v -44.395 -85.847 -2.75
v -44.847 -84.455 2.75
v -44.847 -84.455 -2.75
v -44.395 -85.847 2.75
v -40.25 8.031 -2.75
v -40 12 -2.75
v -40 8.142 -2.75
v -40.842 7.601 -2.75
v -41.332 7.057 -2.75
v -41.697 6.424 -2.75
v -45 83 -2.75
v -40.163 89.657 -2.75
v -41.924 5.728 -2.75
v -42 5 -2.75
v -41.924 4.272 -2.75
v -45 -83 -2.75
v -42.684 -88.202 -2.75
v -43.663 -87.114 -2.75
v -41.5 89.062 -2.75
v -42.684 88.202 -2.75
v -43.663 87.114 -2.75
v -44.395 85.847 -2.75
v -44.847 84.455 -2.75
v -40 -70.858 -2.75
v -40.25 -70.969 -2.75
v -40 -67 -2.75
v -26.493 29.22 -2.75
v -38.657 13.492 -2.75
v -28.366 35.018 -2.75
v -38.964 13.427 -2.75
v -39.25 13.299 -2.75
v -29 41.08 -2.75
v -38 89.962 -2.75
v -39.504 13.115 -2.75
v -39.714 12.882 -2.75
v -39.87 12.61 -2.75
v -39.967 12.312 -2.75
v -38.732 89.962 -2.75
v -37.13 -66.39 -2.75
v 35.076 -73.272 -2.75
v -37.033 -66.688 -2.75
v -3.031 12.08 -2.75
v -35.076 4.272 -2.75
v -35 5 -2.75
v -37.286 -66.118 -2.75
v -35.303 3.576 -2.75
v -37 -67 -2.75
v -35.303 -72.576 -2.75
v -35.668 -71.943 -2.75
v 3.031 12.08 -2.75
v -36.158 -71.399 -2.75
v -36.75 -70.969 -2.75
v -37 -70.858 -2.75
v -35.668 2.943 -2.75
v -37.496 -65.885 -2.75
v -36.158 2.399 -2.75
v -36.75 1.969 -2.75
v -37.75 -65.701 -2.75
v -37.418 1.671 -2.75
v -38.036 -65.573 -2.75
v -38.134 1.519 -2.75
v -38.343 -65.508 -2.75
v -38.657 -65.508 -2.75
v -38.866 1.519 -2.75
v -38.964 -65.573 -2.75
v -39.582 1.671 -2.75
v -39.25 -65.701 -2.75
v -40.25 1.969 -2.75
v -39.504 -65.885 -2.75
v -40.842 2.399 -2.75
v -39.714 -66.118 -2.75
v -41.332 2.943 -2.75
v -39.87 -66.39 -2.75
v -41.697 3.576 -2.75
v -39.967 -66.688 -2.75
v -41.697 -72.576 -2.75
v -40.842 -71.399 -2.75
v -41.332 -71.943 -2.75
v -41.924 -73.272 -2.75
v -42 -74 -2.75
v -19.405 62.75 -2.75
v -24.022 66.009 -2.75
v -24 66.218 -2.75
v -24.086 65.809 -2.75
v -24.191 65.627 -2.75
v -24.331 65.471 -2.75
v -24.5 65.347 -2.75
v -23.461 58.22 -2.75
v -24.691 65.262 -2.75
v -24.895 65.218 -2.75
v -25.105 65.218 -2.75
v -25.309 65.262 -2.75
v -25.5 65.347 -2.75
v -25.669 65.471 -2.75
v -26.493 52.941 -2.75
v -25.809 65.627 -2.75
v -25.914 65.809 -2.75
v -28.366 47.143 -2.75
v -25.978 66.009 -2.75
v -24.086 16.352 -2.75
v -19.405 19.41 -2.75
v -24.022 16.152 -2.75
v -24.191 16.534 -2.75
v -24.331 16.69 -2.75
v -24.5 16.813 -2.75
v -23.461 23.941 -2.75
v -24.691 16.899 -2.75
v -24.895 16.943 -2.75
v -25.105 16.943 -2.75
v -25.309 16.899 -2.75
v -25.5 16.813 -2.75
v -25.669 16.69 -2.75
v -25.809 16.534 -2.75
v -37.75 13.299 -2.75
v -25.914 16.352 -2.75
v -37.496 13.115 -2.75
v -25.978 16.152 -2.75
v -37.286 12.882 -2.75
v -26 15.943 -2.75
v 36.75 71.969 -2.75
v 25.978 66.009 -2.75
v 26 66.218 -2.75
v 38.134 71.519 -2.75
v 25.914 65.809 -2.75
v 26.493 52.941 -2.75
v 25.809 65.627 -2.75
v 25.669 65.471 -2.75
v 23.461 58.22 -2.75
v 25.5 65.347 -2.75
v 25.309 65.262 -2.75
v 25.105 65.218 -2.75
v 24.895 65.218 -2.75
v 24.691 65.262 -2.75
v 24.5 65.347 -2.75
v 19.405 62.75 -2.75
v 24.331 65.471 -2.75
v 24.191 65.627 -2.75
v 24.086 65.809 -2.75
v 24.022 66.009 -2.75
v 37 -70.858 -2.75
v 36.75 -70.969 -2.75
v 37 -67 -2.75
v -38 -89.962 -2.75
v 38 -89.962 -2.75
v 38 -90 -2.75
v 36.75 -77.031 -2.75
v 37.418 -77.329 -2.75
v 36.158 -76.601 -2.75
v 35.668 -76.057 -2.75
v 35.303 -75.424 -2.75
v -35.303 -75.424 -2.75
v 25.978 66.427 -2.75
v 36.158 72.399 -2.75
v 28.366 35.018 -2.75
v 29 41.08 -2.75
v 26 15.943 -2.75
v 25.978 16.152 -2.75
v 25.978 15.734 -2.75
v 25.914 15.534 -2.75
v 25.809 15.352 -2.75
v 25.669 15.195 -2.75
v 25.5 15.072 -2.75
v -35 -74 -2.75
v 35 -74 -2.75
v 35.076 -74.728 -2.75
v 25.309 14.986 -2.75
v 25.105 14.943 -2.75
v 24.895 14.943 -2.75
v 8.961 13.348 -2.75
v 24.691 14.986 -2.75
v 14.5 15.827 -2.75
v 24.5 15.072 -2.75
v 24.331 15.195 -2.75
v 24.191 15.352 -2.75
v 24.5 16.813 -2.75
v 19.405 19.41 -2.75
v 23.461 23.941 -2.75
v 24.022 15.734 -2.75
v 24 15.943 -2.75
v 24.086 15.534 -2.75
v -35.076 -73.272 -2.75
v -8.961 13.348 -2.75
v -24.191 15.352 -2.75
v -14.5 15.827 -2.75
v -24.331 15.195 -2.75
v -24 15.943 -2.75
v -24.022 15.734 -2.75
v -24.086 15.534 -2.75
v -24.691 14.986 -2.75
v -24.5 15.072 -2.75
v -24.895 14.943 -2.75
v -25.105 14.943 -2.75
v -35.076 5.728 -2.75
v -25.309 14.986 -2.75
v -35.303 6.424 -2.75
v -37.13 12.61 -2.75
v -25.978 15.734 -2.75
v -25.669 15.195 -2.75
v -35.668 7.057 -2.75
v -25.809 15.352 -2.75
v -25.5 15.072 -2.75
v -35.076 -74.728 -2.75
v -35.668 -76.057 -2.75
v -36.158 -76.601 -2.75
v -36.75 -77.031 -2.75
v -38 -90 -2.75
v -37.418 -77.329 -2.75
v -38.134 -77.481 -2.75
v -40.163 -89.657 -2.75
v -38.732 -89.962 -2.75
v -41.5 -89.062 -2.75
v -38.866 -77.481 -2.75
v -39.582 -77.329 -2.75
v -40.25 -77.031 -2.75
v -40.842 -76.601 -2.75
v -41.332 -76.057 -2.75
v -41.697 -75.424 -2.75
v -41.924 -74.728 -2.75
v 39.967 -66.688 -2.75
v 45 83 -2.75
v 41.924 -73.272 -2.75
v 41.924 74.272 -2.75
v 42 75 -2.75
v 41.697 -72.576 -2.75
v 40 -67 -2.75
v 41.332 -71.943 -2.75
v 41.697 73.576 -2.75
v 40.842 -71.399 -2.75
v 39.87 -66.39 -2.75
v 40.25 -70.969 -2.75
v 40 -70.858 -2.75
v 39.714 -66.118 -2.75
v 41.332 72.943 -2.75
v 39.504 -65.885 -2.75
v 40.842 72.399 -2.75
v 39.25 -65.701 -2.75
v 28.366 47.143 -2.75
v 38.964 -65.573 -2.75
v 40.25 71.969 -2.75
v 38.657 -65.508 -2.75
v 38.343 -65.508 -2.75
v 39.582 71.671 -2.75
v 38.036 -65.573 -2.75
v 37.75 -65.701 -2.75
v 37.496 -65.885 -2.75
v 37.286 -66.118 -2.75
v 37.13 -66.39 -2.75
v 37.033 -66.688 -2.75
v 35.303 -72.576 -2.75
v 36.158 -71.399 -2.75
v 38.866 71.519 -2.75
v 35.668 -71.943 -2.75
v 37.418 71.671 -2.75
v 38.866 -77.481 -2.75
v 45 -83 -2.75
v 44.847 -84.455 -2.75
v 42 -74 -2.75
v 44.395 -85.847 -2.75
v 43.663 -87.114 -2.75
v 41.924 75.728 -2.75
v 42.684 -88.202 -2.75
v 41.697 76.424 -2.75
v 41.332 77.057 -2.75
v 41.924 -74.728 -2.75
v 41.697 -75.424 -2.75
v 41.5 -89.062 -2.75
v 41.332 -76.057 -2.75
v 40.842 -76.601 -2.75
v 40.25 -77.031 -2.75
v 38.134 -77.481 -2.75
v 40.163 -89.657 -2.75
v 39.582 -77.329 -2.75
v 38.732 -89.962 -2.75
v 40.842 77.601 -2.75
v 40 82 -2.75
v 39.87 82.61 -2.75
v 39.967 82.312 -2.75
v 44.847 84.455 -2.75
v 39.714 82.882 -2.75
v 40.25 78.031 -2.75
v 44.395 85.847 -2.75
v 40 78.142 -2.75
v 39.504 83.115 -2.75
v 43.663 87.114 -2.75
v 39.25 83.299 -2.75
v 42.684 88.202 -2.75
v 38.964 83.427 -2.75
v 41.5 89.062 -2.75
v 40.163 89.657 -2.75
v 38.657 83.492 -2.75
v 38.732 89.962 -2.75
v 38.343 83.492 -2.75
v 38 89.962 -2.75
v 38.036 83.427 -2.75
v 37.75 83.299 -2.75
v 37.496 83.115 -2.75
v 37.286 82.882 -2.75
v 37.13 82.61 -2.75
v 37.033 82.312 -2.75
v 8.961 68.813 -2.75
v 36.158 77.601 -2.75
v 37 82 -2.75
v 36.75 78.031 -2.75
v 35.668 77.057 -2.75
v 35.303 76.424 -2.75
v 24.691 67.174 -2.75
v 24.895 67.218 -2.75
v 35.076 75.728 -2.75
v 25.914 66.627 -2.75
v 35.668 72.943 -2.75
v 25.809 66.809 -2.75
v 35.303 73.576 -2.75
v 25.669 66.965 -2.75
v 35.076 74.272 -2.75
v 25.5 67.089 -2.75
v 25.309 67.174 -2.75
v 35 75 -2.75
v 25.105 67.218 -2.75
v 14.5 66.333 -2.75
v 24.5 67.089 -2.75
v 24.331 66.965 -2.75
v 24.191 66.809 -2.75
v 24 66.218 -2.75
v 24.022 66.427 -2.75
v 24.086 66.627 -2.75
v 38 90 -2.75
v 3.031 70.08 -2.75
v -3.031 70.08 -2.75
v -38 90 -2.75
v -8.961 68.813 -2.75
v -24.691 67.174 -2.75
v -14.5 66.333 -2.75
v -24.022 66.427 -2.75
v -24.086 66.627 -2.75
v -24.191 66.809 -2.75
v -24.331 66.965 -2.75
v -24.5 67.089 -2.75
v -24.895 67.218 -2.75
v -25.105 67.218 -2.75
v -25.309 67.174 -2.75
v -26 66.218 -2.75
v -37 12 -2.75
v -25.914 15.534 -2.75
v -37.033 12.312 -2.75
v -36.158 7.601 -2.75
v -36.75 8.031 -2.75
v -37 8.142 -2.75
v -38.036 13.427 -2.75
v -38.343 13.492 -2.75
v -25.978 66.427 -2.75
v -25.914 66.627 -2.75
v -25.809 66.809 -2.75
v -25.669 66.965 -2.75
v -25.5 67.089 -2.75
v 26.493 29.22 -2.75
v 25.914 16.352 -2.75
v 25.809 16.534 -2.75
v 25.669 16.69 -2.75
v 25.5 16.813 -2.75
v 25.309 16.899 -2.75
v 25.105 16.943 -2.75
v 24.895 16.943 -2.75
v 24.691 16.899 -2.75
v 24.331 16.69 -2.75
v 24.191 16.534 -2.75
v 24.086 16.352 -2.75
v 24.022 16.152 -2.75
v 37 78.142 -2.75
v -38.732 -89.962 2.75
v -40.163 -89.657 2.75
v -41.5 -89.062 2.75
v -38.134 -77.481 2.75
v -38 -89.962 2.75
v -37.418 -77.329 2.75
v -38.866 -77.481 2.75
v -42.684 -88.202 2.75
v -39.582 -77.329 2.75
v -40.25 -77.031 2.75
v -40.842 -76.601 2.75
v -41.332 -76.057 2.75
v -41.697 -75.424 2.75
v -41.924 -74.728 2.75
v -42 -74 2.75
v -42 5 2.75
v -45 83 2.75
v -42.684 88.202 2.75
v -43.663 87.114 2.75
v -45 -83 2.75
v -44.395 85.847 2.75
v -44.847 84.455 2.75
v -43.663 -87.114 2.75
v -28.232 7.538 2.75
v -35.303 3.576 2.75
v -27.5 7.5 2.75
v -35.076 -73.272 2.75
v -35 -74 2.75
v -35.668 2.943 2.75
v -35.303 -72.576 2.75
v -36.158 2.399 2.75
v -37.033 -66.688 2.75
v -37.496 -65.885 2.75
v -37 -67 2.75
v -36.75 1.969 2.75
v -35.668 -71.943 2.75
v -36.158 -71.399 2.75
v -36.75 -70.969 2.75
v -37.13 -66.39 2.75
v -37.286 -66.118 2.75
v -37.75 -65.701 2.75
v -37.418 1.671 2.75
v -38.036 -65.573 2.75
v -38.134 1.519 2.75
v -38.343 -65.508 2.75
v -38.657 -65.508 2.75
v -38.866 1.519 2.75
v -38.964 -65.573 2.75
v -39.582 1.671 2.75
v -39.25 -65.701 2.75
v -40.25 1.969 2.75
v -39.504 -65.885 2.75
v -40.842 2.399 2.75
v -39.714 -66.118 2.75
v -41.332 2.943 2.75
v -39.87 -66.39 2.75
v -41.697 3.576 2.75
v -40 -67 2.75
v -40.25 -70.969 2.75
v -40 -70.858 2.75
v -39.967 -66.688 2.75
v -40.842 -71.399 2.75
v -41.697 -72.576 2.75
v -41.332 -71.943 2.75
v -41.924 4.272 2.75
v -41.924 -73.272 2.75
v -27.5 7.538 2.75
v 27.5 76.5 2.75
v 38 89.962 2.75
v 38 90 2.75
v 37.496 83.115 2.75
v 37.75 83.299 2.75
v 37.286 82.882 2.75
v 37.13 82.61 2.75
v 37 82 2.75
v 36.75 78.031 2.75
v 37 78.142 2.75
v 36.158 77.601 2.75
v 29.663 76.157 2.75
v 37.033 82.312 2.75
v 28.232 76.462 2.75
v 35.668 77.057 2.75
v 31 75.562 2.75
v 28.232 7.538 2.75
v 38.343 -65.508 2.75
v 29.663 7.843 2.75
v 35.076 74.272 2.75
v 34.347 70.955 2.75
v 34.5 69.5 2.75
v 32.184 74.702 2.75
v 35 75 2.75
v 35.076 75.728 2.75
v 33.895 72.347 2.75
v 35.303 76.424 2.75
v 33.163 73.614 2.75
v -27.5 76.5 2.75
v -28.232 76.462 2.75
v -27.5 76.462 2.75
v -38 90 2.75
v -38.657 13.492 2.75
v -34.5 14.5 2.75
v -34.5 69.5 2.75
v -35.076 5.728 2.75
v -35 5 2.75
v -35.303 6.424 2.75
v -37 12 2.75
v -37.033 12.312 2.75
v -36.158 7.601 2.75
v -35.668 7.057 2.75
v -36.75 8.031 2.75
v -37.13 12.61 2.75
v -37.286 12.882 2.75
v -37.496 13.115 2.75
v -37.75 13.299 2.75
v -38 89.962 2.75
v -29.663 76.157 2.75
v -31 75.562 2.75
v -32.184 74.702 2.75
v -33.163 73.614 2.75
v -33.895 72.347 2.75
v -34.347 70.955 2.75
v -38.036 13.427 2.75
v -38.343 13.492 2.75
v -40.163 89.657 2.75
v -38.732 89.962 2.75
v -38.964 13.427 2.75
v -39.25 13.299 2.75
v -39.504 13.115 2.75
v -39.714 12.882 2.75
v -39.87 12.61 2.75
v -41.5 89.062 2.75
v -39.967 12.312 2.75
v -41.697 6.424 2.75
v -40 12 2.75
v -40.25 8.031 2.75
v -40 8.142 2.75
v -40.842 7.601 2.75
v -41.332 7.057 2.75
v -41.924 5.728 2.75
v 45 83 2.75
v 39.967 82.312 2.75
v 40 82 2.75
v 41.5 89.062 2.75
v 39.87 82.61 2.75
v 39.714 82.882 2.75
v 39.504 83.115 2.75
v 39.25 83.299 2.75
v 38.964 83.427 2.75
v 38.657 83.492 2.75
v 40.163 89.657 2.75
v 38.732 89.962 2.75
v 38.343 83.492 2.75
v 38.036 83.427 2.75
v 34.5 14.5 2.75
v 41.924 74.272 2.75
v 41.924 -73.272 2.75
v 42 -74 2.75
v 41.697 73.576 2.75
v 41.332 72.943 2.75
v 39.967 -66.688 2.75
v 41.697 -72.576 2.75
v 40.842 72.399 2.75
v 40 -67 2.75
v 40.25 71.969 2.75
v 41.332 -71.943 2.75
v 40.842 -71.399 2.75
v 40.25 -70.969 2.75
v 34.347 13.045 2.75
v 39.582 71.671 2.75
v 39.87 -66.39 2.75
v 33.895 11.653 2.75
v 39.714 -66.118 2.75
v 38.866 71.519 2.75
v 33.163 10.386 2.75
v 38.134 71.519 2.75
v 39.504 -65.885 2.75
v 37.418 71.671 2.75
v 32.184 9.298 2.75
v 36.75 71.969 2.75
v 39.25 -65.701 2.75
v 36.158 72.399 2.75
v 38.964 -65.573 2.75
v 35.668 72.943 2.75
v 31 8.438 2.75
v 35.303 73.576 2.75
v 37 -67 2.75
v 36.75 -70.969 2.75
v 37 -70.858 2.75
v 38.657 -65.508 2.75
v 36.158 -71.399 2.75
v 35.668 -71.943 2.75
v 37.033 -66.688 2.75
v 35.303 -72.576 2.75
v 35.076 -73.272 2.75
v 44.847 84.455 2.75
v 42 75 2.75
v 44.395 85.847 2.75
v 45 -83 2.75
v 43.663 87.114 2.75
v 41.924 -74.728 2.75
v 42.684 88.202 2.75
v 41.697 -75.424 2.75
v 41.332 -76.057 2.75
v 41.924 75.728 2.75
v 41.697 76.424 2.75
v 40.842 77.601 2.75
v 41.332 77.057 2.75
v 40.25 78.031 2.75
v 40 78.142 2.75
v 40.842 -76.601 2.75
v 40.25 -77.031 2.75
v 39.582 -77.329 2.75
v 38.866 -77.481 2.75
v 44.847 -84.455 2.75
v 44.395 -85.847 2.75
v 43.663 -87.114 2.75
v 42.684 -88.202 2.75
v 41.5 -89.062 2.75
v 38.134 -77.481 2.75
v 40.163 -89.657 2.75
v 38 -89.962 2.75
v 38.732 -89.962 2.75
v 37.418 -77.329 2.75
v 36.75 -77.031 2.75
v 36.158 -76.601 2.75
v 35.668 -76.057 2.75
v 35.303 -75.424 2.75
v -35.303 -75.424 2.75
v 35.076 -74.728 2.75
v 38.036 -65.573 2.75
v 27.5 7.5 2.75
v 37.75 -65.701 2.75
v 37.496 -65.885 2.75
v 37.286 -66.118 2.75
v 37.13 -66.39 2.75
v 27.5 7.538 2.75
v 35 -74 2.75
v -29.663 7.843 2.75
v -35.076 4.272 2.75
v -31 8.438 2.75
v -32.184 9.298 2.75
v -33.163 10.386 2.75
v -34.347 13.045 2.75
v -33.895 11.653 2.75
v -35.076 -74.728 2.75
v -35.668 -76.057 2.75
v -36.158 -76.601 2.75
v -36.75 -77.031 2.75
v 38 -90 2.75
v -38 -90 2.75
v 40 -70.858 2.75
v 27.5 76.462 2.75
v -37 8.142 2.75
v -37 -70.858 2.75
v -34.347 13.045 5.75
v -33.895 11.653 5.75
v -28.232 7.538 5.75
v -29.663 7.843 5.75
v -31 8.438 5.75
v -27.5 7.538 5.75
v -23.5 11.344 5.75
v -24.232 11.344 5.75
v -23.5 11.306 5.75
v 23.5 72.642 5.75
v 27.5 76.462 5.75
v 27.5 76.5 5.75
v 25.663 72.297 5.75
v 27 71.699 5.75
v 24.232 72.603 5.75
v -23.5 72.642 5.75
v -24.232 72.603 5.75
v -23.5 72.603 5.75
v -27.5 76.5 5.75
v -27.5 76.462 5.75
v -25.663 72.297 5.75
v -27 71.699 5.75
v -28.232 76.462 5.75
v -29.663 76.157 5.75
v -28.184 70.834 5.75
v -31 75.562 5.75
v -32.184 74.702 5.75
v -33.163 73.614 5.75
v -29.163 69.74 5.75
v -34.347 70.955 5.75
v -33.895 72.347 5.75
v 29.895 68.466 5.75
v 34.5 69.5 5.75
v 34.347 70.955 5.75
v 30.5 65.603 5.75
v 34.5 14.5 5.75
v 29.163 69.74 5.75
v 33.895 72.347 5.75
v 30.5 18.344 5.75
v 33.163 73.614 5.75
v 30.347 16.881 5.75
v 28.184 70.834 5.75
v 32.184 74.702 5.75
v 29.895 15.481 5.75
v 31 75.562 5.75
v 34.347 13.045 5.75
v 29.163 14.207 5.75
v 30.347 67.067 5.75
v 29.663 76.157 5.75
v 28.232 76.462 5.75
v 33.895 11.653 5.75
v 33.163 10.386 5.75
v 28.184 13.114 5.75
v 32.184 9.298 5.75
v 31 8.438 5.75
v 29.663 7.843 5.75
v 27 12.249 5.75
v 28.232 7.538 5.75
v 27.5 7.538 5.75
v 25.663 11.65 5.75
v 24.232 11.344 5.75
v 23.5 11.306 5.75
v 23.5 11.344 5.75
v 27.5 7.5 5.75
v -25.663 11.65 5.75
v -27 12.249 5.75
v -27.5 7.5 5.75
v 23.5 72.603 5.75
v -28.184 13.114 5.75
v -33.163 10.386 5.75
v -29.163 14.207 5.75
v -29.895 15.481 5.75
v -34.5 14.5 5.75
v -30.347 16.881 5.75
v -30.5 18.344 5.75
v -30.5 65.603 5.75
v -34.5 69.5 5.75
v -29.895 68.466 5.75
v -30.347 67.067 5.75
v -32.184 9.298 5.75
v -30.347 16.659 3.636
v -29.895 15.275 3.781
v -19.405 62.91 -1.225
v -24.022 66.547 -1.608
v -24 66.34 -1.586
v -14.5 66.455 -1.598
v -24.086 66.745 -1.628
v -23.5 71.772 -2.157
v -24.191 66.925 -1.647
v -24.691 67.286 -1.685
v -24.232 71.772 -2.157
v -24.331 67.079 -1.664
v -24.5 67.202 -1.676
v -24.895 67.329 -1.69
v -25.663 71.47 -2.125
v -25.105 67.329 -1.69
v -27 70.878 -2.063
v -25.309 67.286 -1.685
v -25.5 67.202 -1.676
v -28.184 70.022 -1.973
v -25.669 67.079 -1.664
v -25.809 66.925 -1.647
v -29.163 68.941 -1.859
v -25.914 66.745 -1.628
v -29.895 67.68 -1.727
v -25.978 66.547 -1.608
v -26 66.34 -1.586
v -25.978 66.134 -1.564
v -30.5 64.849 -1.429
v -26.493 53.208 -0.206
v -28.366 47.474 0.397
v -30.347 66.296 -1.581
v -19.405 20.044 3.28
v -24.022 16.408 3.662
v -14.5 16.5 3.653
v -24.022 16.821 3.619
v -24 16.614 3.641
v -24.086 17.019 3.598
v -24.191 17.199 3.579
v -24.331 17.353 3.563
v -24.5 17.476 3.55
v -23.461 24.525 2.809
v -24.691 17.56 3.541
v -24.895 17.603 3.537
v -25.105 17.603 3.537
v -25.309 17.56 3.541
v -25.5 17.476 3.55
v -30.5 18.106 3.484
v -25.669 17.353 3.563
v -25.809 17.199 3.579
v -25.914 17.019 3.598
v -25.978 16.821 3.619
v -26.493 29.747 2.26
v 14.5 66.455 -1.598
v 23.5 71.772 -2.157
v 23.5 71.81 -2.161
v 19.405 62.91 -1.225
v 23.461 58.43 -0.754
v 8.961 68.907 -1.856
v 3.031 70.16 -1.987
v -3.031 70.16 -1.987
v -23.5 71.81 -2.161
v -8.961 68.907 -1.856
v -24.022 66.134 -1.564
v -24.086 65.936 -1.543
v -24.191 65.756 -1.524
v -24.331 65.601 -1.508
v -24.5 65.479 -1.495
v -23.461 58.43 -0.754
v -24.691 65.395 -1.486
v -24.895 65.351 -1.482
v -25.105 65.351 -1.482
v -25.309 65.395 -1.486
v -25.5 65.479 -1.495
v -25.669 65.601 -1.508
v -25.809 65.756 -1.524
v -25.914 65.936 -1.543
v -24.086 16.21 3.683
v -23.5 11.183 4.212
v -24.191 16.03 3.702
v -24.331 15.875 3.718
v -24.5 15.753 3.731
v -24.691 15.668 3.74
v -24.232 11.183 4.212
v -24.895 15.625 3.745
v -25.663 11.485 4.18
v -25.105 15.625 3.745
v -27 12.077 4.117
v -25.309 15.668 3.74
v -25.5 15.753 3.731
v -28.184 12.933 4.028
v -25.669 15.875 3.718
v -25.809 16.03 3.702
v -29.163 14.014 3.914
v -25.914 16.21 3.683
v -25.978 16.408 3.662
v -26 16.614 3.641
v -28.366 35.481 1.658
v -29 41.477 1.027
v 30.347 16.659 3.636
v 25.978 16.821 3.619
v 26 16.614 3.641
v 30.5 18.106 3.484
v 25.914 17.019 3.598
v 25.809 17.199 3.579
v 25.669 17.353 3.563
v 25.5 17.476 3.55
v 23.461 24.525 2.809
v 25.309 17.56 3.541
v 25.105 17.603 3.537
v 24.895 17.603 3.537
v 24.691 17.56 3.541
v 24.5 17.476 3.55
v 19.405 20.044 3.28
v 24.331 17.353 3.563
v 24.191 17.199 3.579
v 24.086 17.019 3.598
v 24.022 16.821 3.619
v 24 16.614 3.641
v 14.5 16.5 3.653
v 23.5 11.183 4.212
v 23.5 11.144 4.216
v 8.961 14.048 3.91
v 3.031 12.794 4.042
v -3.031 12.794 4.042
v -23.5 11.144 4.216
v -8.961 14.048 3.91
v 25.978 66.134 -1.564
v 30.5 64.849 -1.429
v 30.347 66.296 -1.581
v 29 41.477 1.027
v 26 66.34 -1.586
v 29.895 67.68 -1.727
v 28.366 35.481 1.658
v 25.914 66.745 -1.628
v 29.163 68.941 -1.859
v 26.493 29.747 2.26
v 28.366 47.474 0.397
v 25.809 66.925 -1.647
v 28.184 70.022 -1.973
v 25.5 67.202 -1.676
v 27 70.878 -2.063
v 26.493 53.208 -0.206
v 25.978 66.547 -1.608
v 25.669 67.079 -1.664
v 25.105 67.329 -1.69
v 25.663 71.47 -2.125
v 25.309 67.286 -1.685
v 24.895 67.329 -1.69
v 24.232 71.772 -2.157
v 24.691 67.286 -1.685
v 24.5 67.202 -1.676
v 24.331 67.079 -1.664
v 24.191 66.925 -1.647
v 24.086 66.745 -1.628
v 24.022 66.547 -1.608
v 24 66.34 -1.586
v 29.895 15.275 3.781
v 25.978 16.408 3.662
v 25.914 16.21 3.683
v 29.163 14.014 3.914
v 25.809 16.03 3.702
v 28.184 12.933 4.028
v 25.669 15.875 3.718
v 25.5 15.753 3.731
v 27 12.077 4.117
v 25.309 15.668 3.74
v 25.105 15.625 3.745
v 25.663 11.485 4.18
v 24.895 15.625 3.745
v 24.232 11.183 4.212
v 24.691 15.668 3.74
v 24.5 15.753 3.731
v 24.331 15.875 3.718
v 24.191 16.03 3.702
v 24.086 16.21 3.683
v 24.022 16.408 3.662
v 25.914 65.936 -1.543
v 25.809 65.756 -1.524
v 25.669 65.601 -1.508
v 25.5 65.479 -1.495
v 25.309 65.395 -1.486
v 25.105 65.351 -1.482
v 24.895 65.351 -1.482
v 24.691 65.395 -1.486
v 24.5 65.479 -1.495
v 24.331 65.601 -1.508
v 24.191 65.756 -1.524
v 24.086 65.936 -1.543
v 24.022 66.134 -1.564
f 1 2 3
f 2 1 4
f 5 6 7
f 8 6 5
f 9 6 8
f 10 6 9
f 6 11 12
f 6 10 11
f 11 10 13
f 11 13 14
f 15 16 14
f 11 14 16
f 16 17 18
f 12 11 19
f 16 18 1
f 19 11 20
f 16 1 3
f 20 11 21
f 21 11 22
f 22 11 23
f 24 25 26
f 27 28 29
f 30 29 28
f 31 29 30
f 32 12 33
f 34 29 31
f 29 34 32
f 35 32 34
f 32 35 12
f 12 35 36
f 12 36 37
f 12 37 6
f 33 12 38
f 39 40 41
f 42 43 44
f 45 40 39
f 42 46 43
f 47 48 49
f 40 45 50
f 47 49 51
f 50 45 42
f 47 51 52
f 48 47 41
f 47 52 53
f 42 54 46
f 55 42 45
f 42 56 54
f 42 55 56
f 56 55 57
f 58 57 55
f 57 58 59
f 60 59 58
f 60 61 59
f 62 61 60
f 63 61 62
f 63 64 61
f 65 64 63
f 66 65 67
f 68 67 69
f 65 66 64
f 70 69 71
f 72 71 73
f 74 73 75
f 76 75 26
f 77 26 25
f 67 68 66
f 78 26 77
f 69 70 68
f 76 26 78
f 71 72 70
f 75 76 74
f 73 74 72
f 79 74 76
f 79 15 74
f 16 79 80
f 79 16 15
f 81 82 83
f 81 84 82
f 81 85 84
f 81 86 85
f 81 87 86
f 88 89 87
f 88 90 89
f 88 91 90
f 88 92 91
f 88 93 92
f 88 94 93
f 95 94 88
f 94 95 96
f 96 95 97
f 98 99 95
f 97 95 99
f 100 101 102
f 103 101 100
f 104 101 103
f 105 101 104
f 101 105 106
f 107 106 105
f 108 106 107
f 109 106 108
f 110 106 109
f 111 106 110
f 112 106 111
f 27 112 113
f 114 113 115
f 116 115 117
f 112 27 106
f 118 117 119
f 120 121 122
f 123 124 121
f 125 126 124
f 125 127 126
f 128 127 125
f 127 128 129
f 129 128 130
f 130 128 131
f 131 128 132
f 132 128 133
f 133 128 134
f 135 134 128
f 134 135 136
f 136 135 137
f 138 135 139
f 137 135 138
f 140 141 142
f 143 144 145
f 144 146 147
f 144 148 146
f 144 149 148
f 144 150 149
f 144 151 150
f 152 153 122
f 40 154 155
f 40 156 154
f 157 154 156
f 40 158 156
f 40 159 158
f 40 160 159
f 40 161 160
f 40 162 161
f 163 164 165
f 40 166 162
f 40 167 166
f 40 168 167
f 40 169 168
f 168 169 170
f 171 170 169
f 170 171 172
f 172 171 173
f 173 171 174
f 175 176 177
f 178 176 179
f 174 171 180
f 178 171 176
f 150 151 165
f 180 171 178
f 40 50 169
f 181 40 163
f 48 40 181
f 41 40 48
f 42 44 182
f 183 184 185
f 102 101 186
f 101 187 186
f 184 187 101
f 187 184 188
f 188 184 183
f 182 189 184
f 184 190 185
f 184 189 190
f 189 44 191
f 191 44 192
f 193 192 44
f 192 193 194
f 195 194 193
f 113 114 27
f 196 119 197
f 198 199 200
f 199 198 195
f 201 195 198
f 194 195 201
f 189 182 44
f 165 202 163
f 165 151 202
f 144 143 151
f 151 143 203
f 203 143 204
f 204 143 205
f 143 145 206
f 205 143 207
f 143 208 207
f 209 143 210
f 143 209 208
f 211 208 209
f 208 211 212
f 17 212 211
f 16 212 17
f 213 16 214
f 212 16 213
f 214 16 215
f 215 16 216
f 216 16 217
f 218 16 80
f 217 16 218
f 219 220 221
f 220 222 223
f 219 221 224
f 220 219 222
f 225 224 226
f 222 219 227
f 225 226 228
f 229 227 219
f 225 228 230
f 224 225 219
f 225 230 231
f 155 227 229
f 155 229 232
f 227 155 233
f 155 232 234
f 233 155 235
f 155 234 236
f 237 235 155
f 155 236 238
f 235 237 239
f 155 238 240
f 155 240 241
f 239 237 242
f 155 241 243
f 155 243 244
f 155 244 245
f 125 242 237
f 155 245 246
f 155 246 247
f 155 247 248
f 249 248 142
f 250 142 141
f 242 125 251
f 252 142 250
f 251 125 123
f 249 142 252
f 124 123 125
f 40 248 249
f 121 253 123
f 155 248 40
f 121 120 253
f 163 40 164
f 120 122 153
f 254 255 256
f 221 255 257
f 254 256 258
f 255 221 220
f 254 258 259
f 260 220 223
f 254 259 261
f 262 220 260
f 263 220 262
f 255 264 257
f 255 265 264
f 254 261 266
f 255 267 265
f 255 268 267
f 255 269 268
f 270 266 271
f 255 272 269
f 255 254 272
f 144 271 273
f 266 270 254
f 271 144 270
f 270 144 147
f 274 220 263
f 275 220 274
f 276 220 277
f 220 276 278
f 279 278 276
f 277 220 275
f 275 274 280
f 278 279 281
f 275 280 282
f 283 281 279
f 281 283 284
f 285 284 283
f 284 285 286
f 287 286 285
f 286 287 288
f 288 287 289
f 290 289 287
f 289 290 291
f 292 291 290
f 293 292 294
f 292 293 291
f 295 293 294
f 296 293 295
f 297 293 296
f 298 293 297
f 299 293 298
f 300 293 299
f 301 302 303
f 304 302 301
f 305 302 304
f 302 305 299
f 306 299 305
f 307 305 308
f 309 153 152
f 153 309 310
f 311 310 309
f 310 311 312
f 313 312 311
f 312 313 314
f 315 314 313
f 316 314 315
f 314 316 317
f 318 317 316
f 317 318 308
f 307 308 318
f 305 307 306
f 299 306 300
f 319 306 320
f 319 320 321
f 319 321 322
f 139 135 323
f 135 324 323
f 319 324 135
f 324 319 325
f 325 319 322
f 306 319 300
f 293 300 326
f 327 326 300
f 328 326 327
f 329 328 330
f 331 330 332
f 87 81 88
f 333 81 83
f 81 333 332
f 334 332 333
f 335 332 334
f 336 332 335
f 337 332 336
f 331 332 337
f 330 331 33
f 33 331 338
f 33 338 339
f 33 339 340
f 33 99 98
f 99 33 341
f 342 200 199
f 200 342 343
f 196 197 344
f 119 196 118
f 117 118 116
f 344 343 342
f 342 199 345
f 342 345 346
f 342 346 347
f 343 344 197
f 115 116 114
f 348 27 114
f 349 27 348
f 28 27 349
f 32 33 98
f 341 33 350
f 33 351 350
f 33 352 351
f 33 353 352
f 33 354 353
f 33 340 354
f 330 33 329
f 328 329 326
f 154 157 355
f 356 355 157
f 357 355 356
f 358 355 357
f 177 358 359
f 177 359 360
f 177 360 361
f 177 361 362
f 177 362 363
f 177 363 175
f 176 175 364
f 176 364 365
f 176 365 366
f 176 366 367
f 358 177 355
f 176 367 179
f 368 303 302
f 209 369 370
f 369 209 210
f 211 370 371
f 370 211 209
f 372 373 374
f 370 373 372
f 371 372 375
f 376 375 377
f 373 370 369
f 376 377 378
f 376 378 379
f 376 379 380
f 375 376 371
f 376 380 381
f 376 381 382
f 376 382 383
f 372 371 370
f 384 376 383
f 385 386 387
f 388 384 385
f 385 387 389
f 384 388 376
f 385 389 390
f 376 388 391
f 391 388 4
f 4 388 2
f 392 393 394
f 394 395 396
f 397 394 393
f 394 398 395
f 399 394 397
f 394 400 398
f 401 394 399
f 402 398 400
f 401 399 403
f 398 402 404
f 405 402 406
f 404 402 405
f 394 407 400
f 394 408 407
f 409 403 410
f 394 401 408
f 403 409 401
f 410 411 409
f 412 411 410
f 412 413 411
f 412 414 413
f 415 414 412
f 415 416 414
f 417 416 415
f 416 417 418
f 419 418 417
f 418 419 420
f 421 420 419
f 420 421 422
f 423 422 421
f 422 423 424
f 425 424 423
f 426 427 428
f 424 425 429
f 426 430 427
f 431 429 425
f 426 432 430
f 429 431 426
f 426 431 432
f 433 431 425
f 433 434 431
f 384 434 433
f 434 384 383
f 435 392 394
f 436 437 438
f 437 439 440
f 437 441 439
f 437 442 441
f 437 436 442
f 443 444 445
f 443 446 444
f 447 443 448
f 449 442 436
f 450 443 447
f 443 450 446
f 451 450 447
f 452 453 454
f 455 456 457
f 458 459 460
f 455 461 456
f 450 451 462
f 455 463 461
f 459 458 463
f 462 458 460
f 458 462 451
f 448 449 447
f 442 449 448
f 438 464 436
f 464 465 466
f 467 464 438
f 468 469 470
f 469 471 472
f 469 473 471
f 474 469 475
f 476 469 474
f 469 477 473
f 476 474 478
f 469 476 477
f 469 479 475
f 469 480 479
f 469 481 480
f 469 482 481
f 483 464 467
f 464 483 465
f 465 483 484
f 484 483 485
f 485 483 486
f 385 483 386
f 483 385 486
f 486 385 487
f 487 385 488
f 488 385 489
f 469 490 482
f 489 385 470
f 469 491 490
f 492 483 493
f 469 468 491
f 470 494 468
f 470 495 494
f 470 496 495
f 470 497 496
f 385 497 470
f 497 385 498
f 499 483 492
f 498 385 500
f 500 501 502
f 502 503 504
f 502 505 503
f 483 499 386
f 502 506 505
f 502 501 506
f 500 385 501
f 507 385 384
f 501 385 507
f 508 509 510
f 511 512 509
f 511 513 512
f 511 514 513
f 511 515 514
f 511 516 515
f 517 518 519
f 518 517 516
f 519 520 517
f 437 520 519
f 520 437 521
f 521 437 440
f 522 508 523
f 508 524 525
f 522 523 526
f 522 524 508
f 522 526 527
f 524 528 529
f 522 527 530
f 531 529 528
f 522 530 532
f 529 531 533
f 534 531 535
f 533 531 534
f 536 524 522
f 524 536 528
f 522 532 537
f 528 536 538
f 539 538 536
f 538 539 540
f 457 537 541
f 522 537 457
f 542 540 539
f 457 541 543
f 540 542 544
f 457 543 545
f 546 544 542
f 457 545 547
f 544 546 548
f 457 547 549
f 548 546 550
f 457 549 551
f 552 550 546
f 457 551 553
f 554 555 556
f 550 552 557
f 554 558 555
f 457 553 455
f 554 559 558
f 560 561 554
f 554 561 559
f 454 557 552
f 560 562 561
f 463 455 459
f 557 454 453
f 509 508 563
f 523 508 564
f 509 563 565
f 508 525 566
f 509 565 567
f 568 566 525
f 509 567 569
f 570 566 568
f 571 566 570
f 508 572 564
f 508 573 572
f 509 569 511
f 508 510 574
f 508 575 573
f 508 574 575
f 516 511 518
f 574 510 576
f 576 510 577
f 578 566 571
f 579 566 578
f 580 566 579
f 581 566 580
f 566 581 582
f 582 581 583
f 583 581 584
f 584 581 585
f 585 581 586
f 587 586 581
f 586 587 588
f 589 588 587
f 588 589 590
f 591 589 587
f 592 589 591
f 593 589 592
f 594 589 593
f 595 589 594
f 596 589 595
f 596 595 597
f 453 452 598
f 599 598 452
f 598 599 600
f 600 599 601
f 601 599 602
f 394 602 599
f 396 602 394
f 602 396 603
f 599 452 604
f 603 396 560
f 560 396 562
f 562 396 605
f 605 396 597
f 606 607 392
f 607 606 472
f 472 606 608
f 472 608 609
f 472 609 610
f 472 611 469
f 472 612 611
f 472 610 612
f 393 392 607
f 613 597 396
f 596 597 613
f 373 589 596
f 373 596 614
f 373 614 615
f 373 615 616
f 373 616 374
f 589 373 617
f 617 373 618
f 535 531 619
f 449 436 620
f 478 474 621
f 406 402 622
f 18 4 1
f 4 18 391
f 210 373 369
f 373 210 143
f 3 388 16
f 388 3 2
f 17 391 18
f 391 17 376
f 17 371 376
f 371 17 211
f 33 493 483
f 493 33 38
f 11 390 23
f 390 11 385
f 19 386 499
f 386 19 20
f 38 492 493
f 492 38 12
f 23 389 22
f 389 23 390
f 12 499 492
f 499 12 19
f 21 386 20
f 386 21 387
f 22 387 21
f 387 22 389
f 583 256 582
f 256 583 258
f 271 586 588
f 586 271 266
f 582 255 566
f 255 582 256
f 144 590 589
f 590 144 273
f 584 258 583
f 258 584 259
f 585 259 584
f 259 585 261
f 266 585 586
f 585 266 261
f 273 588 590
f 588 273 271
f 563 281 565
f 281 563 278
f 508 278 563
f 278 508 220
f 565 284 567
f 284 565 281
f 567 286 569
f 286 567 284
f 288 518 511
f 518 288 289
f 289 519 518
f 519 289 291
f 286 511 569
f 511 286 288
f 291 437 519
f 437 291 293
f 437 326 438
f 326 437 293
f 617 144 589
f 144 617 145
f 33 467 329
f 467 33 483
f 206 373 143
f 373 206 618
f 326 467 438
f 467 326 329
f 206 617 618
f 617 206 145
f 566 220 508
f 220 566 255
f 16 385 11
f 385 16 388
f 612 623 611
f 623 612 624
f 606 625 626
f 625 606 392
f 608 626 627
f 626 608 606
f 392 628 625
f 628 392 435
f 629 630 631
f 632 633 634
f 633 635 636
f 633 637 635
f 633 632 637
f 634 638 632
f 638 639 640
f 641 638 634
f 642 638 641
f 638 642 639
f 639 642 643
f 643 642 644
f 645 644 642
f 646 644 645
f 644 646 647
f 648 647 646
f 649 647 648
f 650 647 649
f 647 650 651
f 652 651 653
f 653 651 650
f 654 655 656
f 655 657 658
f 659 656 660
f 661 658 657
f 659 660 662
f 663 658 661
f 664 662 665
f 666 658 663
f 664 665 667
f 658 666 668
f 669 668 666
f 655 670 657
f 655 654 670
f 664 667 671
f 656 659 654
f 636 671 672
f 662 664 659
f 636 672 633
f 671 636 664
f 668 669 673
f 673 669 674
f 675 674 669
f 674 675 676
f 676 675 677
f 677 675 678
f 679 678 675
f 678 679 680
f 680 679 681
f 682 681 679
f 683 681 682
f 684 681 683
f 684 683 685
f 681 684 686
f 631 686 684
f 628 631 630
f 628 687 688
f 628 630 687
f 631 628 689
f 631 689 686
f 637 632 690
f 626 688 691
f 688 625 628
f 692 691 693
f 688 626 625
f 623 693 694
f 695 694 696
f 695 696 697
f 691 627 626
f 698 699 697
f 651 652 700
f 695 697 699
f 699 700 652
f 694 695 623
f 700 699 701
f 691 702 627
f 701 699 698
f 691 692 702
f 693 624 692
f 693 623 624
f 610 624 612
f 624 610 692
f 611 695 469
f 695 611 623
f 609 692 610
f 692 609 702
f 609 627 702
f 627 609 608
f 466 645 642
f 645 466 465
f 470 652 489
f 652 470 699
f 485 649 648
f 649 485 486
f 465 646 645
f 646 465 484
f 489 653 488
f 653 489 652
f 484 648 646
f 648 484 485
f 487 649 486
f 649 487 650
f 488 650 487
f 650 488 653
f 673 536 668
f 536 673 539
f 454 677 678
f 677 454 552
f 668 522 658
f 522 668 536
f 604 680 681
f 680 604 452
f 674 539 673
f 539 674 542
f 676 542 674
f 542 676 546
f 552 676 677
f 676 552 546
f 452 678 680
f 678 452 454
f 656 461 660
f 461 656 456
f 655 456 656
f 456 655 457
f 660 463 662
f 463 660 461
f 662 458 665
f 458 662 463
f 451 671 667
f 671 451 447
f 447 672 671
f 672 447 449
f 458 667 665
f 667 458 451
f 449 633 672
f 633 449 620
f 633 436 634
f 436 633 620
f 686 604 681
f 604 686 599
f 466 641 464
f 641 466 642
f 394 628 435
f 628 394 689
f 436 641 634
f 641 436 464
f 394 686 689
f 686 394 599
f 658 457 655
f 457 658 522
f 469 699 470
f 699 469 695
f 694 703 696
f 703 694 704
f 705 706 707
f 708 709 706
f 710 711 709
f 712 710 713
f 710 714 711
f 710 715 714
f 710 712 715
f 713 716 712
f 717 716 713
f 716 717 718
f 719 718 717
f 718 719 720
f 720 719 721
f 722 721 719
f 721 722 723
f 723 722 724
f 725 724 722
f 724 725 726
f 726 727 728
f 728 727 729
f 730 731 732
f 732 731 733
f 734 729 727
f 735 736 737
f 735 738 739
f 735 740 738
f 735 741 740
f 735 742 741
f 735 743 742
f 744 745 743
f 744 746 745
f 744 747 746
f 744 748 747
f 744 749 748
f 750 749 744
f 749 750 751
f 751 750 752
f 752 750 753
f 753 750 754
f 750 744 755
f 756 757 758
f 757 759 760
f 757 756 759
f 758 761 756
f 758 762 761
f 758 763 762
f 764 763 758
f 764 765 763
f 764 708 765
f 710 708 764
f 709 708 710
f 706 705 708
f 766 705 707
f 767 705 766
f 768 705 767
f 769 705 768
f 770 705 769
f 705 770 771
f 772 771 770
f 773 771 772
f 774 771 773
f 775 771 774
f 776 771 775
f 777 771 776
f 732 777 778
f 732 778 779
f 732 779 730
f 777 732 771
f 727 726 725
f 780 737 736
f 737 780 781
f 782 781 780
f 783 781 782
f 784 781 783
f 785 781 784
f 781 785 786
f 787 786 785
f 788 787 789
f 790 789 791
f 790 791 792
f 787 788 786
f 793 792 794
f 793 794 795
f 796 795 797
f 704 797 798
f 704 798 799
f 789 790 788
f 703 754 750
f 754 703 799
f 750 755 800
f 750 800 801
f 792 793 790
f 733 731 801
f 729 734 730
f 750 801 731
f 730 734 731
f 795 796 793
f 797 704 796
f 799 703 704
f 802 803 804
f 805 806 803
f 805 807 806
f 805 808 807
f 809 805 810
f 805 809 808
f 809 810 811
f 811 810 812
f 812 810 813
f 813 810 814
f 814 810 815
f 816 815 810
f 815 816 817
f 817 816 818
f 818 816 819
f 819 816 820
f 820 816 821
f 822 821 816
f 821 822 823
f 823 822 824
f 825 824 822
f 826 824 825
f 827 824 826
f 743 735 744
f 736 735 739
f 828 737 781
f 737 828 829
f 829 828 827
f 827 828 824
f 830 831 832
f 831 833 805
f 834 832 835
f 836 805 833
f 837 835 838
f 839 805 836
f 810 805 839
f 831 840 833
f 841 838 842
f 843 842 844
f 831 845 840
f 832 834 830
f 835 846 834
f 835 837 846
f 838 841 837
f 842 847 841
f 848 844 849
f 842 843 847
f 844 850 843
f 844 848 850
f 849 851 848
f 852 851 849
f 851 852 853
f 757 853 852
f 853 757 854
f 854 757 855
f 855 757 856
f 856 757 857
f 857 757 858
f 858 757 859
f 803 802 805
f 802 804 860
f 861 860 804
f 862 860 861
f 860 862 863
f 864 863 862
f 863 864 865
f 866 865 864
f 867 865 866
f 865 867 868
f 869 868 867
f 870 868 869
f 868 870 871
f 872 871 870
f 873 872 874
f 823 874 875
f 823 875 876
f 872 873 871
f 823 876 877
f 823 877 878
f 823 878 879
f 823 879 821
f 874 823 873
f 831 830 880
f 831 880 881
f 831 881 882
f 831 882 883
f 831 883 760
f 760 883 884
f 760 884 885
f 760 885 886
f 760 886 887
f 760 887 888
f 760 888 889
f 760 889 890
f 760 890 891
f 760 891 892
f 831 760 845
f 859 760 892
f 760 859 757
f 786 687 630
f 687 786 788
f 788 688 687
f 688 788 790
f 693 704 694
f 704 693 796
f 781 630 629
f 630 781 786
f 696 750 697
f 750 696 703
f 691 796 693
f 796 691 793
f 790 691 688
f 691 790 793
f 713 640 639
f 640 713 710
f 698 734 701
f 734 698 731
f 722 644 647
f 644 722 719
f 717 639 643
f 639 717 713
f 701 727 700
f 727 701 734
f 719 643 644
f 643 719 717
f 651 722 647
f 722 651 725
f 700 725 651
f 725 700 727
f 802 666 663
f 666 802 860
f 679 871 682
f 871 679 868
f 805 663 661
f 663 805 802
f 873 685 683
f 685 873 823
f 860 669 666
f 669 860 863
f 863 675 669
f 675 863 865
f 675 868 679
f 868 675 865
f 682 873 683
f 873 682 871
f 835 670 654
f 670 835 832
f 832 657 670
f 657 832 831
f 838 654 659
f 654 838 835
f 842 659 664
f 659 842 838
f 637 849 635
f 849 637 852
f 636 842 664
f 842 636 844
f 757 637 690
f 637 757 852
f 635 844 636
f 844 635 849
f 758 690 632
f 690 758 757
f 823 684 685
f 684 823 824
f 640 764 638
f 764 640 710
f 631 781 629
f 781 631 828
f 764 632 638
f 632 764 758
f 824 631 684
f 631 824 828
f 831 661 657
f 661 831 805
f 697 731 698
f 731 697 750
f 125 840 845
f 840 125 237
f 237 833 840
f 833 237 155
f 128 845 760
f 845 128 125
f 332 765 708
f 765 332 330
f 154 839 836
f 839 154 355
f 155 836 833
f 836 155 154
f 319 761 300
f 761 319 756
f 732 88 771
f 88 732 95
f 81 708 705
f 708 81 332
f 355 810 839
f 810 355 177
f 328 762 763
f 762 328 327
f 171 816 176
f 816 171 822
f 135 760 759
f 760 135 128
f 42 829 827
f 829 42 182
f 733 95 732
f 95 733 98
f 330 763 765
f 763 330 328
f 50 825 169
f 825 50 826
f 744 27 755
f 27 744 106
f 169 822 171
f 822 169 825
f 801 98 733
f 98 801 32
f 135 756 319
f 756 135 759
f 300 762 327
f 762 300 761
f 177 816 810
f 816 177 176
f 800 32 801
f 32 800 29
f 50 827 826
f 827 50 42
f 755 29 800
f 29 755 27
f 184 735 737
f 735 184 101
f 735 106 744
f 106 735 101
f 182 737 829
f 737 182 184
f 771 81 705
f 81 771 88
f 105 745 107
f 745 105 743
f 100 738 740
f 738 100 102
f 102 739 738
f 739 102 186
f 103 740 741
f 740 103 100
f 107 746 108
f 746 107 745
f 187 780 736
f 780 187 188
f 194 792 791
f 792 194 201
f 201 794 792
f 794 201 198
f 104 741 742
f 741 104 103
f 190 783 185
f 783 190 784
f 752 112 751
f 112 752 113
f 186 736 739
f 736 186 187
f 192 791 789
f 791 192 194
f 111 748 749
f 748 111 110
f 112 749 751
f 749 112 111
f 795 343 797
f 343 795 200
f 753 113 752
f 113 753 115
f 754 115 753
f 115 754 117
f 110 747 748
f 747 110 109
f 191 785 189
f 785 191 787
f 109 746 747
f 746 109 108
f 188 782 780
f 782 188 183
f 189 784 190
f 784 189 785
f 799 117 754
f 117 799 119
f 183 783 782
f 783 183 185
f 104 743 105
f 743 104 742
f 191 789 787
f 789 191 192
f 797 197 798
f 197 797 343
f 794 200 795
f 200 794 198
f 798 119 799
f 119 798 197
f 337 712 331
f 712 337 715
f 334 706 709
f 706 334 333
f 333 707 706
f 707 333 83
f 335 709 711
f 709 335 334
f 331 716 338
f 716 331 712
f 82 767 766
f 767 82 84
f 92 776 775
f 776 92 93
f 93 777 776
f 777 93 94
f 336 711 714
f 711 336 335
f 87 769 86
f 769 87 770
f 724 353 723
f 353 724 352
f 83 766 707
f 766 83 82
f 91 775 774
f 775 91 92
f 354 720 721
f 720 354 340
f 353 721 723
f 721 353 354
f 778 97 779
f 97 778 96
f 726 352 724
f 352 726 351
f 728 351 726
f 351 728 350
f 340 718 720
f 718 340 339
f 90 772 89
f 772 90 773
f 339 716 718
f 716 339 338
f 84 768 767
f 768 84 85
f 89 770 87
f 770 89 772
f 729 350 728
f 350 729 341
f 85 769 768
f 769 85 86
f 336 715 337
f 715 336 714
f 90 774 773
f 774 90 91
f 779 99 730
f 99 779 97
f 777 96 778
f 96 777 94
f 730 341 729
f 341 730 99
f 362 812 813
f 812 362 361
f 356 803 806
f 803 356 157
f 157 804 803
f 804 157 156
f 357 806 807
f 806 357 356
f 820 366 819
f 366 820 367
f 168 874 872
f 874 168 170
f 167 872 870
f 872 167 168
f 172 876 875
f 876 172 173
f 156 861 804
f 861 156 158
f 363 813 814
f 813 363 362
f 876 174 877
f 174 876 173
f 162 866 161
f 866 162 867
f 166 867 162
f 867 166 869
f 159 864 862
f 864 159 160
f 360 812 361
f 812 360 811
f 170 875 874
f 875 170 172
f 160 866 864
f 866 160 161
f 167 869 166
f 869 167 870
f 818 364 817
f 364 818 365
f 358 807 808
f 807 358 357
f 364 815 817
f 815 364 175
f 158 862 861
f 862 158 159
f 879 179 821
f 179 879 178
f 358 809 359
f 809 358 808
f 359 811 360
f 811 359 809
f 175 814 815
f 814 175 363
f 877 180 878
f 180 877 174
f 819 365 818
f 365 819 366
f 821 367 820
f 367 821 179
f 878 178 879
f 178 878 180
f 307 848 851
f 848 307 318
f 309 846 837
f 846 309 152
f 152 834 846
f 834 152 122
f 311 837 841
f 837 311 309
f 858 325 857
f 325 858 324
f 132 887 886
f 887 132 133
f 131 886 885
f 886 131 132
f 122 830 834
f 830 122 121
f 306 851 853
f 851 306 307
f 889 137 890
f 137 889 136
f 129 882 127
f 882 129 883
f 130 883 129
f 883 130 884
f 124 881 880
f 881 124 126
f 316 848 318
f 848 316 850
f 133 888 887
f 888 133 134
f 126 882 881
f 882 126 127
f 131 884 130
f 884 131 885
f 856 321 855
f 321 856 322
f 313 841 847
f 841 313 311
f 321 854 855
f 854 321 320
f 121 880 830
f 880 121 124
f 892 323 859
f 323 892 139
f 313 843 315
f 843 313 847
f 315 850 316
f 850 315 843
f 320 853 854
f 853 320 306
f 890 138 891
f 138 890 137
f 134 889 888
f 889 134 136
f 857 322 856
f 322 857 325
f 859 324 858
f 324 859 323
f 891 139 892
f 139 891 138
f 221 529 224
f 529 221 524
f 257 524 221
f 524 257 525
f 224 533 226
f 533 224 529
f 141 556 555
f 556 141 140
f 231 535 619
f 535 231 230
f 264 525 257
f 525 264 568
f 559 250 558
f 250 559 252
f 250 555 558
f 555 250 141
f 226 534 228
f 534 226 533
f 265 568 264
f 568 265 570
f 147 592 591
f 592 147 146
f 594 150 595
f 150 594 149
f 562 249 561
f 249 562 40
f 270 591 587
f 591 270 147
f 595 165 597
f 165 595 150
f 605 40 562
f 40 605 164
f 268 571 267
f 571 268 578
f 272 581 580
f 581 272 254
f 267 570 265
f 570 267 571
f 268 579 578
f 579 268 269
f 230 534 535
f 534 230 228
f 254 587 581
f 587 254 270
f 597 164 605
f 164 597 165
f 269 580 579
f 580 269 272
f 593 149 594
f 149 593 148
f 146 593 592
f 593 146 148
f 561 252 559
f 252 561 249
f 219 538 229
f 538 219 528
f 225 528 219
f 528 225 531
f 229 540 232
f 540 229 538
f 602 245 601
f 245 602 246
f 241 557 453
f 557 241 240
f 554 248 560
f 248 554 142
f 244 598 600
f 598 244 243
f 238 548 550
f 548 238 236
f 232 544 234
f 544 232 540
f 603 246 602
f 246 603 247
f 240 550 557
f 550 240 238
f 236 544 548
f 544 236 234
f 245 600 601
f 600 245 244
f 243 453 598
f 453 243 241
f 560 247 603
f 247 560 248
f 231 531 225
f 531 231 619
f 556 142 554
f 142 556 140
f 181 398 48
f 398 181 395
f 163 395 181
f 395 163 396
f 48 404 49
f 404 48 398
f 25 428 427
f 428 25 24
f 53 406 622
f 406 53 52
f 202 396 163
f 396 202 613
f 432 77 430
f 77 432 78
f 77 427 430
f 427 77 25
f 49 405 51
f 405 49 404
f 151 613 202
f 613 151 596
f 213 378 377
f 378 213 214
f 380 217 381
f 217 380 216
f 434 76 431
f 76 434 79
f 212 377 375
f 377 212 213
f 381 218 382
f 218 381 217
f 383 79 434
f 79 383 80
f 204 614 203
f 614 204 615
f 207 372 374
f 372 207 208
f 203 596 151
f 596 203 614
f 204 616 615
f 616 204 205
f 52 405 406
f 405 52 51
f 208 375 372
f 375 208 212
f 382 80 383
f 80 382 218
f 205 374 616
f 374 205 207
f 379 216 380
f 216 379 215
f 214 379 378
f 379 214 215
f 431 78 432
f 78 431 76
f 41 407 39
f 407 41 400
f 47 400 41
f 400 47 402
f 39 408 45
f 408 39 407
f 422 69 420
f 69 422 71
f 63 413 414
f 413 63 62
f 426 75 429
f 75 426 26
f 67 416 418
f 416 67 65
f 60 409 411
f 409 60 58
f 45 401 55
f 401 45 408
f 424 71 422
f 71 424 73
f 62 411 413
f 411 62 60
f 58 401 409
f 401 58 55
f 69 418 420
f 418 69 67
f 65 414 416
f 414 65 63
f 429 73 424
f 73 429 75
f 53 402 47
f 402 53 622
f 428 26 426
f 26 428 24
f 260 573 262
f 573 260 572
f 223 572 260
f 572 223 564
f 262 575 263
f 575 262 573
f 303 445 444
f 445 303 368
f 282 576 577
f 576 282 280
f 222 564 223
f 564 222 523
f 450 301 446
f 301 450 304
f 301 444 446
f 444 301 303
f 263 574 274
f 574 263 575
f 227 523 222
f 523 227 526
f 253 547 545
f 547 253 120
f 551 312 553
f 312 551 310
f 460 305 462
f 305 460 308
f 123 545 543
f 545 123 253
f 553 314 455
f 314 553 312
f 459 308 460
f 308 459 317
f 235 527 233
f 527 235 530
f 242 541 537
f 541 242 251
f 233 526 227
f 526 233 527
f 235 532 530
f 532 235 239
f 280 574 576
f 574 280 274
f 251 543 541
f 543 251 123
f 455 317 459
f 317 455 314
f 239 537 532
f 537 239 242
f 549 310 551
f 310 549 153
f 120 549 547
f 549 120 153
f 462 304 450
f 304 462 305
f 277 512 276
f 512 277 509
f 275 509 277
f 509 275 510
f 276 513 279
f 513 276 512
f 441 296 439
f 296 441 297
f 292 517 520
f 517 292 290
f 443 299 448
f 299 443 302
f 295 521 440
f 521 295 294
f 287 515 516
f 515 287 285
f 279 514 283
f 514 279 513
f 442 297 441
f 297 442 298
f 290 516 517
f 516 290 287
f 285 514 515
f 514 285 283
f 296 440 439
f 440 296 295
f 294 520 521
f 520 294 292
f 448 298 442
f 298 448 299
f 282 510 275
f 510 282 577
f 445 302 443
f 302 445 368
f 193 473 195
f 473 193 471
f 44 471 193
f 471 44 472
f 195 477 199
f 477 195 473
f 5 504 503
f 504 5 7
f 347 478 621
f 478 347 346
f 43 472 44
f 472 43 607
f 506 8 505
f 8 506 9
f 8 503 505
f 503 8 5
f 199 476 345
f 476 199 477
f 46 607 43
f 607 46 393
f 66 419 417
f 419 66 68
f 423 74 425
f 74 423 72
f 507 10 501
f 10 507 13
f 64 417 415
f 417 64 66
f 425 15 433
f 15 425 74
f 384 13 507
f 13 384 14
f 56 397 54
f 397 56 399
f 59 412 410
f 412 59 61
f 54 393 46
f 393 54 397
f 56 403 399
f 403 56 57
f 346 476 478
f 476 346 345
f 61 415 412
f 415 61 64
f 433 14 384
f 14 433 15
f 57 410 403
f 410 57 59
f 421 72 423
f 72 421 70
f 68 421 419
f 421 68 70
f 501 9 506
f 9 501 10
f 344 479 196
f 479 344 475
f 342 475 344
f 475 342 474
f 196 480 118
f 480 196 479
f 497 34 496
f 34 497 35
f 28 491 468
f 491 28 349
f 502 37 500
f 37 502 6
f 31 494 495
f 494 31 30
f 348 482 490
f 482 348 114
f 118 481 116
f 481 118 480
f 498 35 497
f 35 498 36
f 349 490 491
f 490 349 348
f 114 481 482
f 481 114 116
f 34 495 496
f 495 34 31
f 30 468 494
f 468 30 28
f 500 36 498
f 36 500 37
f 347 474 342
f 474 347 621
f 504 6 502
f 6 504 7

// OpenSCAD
$fn = 30;

/**
 *  Fan parameters
 */
FAN_WIDTH = 61;
FAN_THICKNESS = 10;
FAN_HOLE_WIDTH = 50;
FAN_DIAMETER = 58;
FAN_SCREW_DIAMETER = 2;

SUPPORT_WIDTH = 90;
SUPPORT_LENGTH = 180;
SUPPORT_THICKNESS = 5.5;

use <MCAD/boxes.scad>;

module fix() {

    cylinder(r = 3.5, h = SUPPORT_THICKNESS * 2);
    
    translate([0, 7, 0]) {
        cylinder(r = 1.5, h = SUPPORT_THICKNESS * 2);
    }

    translate([0, 2, 0]) {
        cube([3, 10, SUPPORT_THICKNESS * 4], center = true);
    }
}

module fan() {
    roundedBox([FAN_WIDTH, FAN_WIDTH, FAN_THICKNESS], 7, true);

    translate([0, 0, -20]) {
        cylinder(r = FAN_DIAMETER / 2, h = 20);
    }

    // Hole
    translate([- FAN_HOLE_WIDTH / 2, - FAN_HOLE_WIDTH / 2, -30]) {
        cylinder(r = FAN_SCREW_DIAMETER / 2, h = 100);
    }

    translate([- FAN_HOLE_WIDTH / 2, FAN_HOLE_WIDTH / 2, -30]) {
        cylinder(r = FAN_SCREW_DIAMETER / 2, h = 100);
    }

    translate([FAN_HOLE_WIDTH / 2, - FAN_HOLE_WIDTH / 2, -30]) {
        cylinder(r = FAN_SCREW_DIAMETER / 2, h = 100);
    }

    translate([FAN_HOLE_WIDTH / 2, FAN_HOLE_WIDTH / 2, -30]) {
        cylinder(r = FAN_SCREW_DIAMETER / 2, h = 100);
    }
}

module support() {
    difference() {
        union() {
            // Main
            roundedBox([SUPPORT_WIDTH, SUPPORT_LENGTH, SUPPORT_THICKNESS], 7, true);
        
            translate([0, 42, SUPPORT_THICKNESS / 2]) {
                roundedBox([FAN_WIDTH + 8, FAN_WIDTH + 8, 6], 7, true);
            }
        }


        translate([0, 42, 6]) {
            rotate([-6, 0, 0]) {
            //rotate([0, 0, 0]) {
                fan();
            }
        }

        // Hole
        translate([SUPPORT_WIDTH / 2 - 6.5, - SUPPORT_LENGTH / 2 + 16, - SUPPORT_THICKNESS]) {
            fix();
        }

        translate([-SUPPORT_WIDTH / 2 + 6.5, - SUPPORT_LENGTH / 2 + 16, - SUPPORT_THICKNESS]) {
            fix();
        }

        translate([SUPPORT_WIDTH / 2 - 6.5, - SUPPORT_LENGTH / 2 + 165, - SUPPORT_THICKNESS]) {
            fix();
        }

        translate([-SUPPORT_WIDTH / 2 + 6.5, - SUPPORT_LENGTH / 2 + 95, - SUPPORT_THICKNESS]) {
            fix();
        }
    }
}

support();

//fan();
